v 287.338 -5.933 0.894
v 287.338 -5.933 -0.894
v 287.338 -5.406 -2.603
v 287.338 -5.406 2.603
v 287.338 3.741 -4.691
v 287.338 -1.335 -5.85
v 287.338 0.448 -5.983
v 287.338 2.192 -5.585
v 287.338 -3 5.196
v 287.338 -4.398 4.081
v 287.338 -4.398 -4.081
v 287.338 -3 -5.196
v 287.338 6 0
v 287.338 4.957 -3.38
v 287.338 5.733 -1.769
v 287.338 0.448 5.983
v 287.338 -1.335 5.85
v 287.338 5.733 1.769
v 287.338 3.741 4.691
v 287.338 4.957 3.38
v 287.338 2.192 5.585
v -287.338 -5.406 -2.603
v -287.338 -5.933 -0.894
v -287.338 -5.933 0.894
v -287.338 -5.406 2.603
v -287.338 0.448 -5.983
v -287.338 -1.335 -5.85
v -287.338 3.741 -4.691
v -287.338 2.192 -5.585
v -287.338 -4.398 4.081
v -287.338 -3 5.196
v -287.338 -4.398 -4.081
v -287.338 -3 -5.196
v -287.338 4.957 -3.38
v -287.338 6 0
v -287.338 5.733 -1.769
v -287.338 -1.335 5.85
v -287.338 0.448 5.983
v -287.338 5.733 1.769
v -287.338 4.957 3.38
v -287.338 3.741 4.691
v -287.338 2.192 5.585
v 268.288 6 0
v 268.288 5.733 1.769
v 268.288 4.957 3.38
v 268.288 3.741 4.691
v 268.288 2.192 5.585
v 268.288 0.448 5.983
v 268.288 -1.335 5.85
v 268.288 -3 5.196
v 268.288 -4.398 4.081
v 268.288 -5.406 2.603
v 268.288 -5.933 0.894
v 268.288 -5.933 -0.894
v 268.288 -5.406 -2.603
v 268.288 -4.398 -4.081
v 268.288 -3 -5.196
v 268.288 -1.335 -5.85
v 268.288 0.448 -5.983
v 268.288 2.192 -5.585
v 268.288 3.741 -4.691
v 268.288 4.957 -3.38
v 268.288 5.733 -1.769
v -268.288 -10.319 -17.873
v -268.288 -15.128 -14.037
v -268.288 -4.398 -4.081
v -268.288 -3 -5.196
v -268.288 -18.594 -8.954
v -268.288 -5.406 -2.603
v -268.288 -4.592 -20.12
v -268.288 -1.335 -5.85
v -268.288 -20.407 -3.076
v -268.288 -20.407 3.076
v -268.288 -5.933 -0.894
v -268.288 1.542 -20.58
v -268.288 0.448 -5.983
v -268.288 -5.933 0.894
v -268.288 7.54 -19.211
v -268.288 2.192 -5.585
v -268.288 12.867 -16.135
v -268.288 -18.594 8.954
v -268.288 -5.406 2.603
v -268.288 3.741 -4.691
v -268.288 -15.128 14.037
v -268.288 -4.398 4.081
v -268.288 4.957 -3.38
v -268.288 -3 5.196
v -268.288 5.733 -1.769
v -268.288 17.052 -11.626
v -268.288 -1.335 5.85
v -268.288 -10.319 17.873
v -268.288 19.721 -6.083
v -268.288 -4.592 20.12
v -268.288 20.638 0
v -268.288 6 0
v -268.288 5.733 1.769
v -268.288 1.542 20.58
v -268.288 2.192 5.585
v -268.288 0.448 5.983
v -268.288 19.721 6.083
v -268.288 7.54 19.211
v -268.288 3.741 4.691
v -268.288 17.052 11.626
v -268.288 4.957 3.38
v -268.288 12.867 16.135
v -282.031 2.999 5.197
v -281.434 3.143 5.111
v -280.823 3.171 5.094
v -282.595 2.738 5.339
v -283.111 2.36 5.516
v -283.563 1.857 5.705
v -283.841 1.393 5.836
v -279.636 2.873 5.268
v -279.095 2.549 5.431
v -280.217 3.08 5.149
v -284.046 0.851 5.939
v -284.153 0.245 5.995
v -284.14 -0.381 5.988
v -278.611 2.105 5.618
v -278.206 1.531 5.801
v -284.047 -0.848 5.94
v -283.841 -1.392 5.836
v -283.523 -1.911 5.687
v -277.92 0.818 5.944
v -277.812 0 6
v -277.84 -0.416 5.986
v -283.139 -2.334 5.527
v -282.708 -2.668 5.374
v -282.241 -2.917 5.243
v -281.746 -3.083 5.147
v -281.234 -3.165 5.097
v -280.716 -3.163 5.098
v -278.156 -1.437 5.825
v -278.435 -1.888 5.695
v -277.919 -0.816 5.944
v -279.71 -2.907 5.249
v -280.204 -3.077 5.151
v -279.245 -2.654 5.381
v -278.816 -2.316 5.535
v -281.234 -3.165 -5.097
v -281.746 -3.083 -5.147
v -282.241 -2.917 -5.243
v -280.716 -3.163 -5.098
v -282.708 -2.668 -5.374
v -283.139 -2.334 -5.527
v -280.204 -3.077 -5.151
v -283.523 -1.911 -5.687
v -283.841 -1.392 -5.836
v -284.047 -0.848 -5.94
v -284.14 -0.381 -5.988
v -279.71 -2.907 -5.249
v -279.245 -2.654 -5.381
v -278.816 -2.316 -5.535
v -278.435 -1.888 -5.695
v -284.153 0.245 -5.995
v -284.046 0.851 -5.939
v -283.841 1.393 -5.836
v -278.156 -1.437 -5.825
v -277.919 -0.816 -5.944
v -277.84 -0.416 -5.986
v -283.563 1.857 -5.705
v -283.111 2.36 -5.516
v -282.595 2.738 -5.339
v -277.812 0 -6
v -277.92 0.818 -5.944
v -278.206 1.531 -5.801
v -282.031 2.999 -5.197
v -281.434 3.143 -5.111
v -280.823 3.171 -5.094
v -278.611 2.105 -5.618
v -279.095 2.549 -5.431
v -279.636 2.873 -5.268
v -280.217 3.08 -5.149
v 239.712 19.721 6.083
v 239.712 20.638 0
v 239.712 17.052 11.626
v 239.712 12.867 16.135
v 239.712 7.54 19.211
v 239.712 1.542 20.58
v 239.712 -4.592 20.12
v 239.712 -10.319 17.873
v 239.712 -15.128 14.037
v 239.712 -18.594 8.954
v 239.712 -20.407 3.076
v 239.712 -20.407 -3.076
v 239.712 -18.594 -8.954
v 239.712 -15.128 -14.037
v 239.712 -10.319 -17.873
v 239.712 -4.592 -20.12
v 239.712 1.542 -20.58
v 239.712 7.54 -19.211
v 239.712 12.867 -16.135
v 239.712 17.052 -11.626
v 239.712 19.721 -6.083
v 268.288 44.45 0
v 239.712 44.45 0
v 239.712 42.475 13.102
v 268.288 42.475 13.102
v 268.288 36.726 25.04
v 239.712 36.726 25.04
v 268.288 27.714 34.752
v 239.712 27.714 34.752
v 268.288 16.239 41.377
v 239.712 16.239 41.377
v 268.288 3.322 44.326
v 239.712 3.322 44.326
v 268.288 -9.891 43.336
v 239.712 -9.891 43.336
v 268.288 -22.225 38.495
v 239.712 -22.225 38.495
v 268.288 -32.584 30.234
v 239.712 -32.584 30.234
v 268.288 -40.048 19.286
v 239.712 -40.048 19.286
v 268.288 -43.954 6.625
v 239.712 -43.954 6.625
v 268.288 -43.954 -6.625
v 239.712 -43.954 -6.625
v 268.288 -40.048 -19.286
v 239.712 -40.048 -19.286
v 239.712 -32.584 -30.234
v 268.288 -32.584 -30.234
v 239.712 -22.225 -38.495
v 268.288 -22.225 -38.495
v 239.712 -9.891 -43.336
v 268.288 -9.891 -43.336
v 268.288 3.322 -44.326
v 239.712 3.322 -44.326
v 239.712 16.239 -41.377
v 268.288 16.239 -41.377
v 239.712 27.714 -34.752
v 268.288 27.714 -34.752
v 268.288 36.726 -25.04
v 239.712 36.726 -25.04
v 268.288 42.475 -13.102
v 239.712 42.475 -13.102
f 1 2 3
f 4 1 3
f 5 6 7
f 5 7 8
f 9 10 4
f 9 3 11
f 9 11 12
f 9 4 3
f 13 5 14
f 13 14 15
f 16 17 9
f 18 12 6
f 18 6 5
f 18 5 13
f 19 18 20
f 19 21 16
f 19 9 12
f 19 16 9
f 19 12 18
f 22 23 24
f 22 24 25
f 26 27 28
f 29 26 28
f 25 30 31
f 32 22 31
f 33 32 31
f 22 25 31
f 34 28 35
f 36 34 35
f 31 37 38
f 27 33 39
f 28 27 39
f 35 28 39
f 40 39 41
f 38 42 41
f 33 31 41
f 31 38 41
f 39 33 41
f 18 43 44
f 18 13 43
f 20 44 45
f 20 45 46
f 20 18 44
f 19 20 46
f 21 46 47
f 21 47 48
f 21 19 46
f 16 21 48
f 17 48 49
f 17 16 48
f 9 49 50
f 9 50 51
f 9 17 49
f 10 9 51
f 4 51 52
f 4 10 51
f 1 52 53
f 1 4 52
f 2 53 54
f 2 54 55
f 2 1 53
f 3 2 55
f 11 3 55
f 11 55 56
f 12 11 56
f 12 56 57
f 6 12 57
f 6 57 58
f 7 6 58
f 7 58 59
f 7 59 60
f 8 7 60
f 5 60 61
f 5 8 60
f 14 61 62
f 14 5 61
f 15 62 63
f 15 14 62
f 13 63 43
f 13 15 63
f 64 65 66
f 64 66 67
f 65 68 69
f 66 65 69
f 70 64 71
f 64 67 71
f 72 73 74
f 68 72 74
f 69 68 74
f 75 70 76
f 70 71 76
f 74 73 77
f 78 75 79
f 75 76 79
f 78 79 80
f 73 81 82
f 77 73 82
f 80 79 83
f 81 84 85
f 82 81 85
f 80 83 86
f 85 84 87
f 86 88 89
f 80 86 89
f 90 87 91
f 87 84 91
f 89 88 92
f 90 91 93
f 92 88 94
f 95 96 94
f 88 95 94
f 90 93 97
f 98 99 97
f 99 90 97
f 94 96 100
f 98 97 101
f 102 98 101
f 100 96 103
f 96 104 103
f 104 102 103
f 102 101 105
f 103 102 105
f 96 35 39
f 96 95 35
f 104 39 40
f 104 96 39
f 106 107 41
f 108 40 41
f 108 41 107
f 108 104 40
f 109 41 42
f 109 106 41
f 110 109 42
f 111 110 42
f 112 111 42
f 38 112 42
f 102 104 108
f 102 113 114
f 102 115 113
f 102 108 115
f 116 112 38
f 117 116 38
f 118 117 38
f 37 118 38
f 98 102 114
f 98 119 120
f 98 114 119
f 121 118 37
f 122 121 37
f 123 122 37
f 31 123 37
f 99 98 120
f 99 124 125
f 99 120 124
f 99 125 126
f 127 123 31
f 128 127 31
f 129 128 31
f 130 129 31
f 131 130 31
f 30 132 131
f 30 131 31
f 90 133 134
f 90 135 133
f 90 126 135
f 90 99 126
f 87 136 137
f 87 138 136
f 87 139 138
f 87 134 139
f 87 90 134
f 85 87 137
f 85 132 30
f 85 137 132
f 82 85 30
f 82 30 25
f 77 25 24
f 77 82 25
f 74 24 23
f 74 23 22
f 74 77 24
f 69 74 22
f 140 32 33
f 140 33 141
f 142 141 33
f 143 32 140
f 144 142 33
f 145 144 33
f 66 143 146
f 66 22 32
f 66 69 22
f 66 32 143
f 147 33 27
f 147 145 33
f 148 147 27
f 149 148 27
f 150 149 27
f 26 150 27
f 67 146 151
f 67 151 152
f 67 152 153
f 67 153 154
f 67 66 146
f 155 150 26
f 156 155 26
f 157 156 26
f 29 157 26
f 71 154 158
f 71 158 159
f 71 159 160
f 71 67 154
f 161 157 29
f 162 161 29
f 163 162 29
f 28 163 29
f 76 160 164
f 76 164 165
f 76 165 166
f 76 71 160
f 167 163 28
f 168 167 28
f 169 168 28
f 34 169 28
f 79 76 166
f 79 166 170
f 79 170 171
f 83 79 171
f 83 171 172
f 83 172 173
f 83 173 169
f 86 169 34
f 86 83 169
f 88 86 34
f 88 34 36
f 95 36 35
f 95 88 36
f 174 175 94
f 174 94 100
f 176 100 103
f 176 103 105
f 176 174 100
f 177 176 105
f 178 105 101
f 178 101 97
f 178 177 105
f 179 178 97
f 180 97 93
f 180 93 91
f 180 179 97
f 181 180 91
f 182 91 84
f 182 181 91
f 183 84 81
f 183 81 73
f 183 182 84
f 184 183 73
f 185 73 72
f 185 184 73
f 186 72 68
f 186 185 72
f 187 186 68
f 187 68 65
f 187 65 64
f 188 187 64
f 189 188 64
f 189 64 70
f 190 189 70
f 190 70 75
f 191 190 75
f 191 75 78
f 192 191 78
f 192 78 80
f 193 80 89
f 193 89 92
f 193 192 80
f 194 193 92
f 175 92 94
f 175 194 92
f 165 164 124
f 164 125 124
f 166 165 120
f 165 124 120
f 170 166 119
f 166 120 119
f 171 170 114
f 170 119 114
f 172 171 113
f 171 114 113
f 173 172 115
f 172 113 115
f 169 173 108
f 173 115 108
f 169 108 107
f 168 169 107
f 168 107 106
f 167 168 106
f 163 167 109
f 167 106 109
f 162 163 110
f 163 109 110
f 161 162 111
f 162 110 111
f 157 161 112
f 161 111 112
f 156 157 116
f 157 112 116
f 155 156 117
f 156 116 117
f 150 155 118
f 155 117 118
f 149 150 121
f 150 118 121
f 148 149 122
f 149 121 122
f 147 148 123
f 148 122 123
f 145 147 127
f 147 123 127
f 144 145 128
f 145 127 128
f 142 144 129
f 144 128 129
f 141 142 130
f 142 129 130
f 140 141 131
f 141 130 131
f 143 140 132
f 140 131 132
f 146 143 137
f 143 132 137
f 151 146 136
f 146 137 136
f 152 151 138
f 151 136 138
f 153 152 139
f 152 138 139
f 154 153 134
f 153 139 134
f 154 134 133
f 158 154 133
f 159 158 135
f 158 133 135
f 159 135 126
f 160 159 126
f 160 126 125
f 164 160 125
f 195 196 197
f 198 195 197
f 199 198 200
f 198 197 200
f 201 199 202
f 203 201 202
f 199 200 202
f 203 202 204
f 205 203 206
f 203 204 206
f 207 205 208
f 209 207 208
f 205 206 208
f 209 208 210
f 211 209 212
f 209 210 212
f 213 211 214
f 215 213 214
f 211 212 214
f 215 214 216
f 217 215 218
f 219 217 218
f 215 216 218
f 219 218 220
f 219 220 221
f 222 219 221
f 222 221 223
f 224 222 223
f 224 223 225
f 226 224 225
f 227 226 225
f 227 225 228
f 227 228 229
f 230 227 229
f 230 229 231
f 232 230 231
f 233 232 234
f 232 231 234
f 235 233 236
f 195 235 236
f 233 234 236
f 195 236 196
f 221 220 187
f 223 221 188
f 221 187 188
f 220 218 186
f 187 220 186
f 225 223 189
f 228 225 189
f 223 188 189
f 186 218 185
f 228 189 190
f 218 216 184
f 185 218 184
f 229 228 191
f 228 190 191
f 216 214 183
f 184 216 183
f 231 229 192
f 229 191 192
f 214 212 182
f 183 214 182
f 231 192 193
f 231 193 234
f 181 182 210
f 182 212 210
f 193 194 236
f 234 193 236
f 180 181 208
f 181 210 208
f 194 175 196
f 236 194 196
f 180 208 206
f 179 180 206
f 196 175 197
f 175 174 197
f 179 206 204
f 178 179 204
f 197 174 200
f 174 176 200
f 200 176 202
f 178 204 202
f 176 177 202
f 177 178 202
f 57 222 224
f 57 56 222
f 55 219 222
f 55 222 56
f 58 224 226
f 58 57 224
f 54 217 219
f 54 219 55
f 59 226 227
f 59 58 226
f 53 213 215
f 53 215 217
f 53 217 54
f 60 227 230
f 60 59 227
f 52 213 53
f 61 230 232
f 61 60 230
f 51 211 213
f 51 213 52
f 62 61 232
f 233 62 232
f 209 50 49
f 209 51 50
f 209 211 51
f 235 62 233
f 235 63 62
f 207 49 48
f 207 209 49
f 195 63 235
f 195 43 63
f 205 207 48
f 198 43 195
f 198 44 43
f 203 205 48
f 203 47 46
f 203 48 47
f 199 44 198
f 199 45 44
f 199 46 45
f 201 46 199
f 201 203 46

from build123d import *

# Parameters (mm, degrees)
F0_R     = 20.6375
F0_R_2   = 6
F1_DEPTH = 268.2875
F2_DEPTH = 287.3375
F3_R     = 3.175
F4_DEPTH = 6.35
F5_START = 239.7125
F0_R_3   = 44.45
F5_DEPTH = 28.575


with BuildPart() as f1:
    # F0 (on Right) → F1 (new body, symmetric)
    with BuildSketch(Plane.YZ):
        Circle(F0_R)
        Circle(F0_R_2, mode=Mode.SUBTRACT)
    extrude(amount=F1_DEPTH, both=True)

    # F0 (on Right) → F2 (join, symmetric)
    with BuildSketch(Plane.YZ):
        Circle(F0_R_2)
    extrude(amount=F2_DEPTH, both=True)

    # F3 (on Top) → F4 (cut, symmetric)
    with BuildSketch(Plane.XY):
        with Locations((-280.9875, 0)):
            Circle(F3_R)
    extrude(amount=F4_DEPTH, both=True, mode=Mode.SUBTRACT)

    # F0 (on Right) → F5 (join)
    with BuildSketch(Plane.YZ.offset(F5_START)):
        Circle(F0_R_3)
        Circle(F0_R, mode=Mode.SUBTRACT)
    extrude(amount=F5_DEPTH)


solid = f1.part
